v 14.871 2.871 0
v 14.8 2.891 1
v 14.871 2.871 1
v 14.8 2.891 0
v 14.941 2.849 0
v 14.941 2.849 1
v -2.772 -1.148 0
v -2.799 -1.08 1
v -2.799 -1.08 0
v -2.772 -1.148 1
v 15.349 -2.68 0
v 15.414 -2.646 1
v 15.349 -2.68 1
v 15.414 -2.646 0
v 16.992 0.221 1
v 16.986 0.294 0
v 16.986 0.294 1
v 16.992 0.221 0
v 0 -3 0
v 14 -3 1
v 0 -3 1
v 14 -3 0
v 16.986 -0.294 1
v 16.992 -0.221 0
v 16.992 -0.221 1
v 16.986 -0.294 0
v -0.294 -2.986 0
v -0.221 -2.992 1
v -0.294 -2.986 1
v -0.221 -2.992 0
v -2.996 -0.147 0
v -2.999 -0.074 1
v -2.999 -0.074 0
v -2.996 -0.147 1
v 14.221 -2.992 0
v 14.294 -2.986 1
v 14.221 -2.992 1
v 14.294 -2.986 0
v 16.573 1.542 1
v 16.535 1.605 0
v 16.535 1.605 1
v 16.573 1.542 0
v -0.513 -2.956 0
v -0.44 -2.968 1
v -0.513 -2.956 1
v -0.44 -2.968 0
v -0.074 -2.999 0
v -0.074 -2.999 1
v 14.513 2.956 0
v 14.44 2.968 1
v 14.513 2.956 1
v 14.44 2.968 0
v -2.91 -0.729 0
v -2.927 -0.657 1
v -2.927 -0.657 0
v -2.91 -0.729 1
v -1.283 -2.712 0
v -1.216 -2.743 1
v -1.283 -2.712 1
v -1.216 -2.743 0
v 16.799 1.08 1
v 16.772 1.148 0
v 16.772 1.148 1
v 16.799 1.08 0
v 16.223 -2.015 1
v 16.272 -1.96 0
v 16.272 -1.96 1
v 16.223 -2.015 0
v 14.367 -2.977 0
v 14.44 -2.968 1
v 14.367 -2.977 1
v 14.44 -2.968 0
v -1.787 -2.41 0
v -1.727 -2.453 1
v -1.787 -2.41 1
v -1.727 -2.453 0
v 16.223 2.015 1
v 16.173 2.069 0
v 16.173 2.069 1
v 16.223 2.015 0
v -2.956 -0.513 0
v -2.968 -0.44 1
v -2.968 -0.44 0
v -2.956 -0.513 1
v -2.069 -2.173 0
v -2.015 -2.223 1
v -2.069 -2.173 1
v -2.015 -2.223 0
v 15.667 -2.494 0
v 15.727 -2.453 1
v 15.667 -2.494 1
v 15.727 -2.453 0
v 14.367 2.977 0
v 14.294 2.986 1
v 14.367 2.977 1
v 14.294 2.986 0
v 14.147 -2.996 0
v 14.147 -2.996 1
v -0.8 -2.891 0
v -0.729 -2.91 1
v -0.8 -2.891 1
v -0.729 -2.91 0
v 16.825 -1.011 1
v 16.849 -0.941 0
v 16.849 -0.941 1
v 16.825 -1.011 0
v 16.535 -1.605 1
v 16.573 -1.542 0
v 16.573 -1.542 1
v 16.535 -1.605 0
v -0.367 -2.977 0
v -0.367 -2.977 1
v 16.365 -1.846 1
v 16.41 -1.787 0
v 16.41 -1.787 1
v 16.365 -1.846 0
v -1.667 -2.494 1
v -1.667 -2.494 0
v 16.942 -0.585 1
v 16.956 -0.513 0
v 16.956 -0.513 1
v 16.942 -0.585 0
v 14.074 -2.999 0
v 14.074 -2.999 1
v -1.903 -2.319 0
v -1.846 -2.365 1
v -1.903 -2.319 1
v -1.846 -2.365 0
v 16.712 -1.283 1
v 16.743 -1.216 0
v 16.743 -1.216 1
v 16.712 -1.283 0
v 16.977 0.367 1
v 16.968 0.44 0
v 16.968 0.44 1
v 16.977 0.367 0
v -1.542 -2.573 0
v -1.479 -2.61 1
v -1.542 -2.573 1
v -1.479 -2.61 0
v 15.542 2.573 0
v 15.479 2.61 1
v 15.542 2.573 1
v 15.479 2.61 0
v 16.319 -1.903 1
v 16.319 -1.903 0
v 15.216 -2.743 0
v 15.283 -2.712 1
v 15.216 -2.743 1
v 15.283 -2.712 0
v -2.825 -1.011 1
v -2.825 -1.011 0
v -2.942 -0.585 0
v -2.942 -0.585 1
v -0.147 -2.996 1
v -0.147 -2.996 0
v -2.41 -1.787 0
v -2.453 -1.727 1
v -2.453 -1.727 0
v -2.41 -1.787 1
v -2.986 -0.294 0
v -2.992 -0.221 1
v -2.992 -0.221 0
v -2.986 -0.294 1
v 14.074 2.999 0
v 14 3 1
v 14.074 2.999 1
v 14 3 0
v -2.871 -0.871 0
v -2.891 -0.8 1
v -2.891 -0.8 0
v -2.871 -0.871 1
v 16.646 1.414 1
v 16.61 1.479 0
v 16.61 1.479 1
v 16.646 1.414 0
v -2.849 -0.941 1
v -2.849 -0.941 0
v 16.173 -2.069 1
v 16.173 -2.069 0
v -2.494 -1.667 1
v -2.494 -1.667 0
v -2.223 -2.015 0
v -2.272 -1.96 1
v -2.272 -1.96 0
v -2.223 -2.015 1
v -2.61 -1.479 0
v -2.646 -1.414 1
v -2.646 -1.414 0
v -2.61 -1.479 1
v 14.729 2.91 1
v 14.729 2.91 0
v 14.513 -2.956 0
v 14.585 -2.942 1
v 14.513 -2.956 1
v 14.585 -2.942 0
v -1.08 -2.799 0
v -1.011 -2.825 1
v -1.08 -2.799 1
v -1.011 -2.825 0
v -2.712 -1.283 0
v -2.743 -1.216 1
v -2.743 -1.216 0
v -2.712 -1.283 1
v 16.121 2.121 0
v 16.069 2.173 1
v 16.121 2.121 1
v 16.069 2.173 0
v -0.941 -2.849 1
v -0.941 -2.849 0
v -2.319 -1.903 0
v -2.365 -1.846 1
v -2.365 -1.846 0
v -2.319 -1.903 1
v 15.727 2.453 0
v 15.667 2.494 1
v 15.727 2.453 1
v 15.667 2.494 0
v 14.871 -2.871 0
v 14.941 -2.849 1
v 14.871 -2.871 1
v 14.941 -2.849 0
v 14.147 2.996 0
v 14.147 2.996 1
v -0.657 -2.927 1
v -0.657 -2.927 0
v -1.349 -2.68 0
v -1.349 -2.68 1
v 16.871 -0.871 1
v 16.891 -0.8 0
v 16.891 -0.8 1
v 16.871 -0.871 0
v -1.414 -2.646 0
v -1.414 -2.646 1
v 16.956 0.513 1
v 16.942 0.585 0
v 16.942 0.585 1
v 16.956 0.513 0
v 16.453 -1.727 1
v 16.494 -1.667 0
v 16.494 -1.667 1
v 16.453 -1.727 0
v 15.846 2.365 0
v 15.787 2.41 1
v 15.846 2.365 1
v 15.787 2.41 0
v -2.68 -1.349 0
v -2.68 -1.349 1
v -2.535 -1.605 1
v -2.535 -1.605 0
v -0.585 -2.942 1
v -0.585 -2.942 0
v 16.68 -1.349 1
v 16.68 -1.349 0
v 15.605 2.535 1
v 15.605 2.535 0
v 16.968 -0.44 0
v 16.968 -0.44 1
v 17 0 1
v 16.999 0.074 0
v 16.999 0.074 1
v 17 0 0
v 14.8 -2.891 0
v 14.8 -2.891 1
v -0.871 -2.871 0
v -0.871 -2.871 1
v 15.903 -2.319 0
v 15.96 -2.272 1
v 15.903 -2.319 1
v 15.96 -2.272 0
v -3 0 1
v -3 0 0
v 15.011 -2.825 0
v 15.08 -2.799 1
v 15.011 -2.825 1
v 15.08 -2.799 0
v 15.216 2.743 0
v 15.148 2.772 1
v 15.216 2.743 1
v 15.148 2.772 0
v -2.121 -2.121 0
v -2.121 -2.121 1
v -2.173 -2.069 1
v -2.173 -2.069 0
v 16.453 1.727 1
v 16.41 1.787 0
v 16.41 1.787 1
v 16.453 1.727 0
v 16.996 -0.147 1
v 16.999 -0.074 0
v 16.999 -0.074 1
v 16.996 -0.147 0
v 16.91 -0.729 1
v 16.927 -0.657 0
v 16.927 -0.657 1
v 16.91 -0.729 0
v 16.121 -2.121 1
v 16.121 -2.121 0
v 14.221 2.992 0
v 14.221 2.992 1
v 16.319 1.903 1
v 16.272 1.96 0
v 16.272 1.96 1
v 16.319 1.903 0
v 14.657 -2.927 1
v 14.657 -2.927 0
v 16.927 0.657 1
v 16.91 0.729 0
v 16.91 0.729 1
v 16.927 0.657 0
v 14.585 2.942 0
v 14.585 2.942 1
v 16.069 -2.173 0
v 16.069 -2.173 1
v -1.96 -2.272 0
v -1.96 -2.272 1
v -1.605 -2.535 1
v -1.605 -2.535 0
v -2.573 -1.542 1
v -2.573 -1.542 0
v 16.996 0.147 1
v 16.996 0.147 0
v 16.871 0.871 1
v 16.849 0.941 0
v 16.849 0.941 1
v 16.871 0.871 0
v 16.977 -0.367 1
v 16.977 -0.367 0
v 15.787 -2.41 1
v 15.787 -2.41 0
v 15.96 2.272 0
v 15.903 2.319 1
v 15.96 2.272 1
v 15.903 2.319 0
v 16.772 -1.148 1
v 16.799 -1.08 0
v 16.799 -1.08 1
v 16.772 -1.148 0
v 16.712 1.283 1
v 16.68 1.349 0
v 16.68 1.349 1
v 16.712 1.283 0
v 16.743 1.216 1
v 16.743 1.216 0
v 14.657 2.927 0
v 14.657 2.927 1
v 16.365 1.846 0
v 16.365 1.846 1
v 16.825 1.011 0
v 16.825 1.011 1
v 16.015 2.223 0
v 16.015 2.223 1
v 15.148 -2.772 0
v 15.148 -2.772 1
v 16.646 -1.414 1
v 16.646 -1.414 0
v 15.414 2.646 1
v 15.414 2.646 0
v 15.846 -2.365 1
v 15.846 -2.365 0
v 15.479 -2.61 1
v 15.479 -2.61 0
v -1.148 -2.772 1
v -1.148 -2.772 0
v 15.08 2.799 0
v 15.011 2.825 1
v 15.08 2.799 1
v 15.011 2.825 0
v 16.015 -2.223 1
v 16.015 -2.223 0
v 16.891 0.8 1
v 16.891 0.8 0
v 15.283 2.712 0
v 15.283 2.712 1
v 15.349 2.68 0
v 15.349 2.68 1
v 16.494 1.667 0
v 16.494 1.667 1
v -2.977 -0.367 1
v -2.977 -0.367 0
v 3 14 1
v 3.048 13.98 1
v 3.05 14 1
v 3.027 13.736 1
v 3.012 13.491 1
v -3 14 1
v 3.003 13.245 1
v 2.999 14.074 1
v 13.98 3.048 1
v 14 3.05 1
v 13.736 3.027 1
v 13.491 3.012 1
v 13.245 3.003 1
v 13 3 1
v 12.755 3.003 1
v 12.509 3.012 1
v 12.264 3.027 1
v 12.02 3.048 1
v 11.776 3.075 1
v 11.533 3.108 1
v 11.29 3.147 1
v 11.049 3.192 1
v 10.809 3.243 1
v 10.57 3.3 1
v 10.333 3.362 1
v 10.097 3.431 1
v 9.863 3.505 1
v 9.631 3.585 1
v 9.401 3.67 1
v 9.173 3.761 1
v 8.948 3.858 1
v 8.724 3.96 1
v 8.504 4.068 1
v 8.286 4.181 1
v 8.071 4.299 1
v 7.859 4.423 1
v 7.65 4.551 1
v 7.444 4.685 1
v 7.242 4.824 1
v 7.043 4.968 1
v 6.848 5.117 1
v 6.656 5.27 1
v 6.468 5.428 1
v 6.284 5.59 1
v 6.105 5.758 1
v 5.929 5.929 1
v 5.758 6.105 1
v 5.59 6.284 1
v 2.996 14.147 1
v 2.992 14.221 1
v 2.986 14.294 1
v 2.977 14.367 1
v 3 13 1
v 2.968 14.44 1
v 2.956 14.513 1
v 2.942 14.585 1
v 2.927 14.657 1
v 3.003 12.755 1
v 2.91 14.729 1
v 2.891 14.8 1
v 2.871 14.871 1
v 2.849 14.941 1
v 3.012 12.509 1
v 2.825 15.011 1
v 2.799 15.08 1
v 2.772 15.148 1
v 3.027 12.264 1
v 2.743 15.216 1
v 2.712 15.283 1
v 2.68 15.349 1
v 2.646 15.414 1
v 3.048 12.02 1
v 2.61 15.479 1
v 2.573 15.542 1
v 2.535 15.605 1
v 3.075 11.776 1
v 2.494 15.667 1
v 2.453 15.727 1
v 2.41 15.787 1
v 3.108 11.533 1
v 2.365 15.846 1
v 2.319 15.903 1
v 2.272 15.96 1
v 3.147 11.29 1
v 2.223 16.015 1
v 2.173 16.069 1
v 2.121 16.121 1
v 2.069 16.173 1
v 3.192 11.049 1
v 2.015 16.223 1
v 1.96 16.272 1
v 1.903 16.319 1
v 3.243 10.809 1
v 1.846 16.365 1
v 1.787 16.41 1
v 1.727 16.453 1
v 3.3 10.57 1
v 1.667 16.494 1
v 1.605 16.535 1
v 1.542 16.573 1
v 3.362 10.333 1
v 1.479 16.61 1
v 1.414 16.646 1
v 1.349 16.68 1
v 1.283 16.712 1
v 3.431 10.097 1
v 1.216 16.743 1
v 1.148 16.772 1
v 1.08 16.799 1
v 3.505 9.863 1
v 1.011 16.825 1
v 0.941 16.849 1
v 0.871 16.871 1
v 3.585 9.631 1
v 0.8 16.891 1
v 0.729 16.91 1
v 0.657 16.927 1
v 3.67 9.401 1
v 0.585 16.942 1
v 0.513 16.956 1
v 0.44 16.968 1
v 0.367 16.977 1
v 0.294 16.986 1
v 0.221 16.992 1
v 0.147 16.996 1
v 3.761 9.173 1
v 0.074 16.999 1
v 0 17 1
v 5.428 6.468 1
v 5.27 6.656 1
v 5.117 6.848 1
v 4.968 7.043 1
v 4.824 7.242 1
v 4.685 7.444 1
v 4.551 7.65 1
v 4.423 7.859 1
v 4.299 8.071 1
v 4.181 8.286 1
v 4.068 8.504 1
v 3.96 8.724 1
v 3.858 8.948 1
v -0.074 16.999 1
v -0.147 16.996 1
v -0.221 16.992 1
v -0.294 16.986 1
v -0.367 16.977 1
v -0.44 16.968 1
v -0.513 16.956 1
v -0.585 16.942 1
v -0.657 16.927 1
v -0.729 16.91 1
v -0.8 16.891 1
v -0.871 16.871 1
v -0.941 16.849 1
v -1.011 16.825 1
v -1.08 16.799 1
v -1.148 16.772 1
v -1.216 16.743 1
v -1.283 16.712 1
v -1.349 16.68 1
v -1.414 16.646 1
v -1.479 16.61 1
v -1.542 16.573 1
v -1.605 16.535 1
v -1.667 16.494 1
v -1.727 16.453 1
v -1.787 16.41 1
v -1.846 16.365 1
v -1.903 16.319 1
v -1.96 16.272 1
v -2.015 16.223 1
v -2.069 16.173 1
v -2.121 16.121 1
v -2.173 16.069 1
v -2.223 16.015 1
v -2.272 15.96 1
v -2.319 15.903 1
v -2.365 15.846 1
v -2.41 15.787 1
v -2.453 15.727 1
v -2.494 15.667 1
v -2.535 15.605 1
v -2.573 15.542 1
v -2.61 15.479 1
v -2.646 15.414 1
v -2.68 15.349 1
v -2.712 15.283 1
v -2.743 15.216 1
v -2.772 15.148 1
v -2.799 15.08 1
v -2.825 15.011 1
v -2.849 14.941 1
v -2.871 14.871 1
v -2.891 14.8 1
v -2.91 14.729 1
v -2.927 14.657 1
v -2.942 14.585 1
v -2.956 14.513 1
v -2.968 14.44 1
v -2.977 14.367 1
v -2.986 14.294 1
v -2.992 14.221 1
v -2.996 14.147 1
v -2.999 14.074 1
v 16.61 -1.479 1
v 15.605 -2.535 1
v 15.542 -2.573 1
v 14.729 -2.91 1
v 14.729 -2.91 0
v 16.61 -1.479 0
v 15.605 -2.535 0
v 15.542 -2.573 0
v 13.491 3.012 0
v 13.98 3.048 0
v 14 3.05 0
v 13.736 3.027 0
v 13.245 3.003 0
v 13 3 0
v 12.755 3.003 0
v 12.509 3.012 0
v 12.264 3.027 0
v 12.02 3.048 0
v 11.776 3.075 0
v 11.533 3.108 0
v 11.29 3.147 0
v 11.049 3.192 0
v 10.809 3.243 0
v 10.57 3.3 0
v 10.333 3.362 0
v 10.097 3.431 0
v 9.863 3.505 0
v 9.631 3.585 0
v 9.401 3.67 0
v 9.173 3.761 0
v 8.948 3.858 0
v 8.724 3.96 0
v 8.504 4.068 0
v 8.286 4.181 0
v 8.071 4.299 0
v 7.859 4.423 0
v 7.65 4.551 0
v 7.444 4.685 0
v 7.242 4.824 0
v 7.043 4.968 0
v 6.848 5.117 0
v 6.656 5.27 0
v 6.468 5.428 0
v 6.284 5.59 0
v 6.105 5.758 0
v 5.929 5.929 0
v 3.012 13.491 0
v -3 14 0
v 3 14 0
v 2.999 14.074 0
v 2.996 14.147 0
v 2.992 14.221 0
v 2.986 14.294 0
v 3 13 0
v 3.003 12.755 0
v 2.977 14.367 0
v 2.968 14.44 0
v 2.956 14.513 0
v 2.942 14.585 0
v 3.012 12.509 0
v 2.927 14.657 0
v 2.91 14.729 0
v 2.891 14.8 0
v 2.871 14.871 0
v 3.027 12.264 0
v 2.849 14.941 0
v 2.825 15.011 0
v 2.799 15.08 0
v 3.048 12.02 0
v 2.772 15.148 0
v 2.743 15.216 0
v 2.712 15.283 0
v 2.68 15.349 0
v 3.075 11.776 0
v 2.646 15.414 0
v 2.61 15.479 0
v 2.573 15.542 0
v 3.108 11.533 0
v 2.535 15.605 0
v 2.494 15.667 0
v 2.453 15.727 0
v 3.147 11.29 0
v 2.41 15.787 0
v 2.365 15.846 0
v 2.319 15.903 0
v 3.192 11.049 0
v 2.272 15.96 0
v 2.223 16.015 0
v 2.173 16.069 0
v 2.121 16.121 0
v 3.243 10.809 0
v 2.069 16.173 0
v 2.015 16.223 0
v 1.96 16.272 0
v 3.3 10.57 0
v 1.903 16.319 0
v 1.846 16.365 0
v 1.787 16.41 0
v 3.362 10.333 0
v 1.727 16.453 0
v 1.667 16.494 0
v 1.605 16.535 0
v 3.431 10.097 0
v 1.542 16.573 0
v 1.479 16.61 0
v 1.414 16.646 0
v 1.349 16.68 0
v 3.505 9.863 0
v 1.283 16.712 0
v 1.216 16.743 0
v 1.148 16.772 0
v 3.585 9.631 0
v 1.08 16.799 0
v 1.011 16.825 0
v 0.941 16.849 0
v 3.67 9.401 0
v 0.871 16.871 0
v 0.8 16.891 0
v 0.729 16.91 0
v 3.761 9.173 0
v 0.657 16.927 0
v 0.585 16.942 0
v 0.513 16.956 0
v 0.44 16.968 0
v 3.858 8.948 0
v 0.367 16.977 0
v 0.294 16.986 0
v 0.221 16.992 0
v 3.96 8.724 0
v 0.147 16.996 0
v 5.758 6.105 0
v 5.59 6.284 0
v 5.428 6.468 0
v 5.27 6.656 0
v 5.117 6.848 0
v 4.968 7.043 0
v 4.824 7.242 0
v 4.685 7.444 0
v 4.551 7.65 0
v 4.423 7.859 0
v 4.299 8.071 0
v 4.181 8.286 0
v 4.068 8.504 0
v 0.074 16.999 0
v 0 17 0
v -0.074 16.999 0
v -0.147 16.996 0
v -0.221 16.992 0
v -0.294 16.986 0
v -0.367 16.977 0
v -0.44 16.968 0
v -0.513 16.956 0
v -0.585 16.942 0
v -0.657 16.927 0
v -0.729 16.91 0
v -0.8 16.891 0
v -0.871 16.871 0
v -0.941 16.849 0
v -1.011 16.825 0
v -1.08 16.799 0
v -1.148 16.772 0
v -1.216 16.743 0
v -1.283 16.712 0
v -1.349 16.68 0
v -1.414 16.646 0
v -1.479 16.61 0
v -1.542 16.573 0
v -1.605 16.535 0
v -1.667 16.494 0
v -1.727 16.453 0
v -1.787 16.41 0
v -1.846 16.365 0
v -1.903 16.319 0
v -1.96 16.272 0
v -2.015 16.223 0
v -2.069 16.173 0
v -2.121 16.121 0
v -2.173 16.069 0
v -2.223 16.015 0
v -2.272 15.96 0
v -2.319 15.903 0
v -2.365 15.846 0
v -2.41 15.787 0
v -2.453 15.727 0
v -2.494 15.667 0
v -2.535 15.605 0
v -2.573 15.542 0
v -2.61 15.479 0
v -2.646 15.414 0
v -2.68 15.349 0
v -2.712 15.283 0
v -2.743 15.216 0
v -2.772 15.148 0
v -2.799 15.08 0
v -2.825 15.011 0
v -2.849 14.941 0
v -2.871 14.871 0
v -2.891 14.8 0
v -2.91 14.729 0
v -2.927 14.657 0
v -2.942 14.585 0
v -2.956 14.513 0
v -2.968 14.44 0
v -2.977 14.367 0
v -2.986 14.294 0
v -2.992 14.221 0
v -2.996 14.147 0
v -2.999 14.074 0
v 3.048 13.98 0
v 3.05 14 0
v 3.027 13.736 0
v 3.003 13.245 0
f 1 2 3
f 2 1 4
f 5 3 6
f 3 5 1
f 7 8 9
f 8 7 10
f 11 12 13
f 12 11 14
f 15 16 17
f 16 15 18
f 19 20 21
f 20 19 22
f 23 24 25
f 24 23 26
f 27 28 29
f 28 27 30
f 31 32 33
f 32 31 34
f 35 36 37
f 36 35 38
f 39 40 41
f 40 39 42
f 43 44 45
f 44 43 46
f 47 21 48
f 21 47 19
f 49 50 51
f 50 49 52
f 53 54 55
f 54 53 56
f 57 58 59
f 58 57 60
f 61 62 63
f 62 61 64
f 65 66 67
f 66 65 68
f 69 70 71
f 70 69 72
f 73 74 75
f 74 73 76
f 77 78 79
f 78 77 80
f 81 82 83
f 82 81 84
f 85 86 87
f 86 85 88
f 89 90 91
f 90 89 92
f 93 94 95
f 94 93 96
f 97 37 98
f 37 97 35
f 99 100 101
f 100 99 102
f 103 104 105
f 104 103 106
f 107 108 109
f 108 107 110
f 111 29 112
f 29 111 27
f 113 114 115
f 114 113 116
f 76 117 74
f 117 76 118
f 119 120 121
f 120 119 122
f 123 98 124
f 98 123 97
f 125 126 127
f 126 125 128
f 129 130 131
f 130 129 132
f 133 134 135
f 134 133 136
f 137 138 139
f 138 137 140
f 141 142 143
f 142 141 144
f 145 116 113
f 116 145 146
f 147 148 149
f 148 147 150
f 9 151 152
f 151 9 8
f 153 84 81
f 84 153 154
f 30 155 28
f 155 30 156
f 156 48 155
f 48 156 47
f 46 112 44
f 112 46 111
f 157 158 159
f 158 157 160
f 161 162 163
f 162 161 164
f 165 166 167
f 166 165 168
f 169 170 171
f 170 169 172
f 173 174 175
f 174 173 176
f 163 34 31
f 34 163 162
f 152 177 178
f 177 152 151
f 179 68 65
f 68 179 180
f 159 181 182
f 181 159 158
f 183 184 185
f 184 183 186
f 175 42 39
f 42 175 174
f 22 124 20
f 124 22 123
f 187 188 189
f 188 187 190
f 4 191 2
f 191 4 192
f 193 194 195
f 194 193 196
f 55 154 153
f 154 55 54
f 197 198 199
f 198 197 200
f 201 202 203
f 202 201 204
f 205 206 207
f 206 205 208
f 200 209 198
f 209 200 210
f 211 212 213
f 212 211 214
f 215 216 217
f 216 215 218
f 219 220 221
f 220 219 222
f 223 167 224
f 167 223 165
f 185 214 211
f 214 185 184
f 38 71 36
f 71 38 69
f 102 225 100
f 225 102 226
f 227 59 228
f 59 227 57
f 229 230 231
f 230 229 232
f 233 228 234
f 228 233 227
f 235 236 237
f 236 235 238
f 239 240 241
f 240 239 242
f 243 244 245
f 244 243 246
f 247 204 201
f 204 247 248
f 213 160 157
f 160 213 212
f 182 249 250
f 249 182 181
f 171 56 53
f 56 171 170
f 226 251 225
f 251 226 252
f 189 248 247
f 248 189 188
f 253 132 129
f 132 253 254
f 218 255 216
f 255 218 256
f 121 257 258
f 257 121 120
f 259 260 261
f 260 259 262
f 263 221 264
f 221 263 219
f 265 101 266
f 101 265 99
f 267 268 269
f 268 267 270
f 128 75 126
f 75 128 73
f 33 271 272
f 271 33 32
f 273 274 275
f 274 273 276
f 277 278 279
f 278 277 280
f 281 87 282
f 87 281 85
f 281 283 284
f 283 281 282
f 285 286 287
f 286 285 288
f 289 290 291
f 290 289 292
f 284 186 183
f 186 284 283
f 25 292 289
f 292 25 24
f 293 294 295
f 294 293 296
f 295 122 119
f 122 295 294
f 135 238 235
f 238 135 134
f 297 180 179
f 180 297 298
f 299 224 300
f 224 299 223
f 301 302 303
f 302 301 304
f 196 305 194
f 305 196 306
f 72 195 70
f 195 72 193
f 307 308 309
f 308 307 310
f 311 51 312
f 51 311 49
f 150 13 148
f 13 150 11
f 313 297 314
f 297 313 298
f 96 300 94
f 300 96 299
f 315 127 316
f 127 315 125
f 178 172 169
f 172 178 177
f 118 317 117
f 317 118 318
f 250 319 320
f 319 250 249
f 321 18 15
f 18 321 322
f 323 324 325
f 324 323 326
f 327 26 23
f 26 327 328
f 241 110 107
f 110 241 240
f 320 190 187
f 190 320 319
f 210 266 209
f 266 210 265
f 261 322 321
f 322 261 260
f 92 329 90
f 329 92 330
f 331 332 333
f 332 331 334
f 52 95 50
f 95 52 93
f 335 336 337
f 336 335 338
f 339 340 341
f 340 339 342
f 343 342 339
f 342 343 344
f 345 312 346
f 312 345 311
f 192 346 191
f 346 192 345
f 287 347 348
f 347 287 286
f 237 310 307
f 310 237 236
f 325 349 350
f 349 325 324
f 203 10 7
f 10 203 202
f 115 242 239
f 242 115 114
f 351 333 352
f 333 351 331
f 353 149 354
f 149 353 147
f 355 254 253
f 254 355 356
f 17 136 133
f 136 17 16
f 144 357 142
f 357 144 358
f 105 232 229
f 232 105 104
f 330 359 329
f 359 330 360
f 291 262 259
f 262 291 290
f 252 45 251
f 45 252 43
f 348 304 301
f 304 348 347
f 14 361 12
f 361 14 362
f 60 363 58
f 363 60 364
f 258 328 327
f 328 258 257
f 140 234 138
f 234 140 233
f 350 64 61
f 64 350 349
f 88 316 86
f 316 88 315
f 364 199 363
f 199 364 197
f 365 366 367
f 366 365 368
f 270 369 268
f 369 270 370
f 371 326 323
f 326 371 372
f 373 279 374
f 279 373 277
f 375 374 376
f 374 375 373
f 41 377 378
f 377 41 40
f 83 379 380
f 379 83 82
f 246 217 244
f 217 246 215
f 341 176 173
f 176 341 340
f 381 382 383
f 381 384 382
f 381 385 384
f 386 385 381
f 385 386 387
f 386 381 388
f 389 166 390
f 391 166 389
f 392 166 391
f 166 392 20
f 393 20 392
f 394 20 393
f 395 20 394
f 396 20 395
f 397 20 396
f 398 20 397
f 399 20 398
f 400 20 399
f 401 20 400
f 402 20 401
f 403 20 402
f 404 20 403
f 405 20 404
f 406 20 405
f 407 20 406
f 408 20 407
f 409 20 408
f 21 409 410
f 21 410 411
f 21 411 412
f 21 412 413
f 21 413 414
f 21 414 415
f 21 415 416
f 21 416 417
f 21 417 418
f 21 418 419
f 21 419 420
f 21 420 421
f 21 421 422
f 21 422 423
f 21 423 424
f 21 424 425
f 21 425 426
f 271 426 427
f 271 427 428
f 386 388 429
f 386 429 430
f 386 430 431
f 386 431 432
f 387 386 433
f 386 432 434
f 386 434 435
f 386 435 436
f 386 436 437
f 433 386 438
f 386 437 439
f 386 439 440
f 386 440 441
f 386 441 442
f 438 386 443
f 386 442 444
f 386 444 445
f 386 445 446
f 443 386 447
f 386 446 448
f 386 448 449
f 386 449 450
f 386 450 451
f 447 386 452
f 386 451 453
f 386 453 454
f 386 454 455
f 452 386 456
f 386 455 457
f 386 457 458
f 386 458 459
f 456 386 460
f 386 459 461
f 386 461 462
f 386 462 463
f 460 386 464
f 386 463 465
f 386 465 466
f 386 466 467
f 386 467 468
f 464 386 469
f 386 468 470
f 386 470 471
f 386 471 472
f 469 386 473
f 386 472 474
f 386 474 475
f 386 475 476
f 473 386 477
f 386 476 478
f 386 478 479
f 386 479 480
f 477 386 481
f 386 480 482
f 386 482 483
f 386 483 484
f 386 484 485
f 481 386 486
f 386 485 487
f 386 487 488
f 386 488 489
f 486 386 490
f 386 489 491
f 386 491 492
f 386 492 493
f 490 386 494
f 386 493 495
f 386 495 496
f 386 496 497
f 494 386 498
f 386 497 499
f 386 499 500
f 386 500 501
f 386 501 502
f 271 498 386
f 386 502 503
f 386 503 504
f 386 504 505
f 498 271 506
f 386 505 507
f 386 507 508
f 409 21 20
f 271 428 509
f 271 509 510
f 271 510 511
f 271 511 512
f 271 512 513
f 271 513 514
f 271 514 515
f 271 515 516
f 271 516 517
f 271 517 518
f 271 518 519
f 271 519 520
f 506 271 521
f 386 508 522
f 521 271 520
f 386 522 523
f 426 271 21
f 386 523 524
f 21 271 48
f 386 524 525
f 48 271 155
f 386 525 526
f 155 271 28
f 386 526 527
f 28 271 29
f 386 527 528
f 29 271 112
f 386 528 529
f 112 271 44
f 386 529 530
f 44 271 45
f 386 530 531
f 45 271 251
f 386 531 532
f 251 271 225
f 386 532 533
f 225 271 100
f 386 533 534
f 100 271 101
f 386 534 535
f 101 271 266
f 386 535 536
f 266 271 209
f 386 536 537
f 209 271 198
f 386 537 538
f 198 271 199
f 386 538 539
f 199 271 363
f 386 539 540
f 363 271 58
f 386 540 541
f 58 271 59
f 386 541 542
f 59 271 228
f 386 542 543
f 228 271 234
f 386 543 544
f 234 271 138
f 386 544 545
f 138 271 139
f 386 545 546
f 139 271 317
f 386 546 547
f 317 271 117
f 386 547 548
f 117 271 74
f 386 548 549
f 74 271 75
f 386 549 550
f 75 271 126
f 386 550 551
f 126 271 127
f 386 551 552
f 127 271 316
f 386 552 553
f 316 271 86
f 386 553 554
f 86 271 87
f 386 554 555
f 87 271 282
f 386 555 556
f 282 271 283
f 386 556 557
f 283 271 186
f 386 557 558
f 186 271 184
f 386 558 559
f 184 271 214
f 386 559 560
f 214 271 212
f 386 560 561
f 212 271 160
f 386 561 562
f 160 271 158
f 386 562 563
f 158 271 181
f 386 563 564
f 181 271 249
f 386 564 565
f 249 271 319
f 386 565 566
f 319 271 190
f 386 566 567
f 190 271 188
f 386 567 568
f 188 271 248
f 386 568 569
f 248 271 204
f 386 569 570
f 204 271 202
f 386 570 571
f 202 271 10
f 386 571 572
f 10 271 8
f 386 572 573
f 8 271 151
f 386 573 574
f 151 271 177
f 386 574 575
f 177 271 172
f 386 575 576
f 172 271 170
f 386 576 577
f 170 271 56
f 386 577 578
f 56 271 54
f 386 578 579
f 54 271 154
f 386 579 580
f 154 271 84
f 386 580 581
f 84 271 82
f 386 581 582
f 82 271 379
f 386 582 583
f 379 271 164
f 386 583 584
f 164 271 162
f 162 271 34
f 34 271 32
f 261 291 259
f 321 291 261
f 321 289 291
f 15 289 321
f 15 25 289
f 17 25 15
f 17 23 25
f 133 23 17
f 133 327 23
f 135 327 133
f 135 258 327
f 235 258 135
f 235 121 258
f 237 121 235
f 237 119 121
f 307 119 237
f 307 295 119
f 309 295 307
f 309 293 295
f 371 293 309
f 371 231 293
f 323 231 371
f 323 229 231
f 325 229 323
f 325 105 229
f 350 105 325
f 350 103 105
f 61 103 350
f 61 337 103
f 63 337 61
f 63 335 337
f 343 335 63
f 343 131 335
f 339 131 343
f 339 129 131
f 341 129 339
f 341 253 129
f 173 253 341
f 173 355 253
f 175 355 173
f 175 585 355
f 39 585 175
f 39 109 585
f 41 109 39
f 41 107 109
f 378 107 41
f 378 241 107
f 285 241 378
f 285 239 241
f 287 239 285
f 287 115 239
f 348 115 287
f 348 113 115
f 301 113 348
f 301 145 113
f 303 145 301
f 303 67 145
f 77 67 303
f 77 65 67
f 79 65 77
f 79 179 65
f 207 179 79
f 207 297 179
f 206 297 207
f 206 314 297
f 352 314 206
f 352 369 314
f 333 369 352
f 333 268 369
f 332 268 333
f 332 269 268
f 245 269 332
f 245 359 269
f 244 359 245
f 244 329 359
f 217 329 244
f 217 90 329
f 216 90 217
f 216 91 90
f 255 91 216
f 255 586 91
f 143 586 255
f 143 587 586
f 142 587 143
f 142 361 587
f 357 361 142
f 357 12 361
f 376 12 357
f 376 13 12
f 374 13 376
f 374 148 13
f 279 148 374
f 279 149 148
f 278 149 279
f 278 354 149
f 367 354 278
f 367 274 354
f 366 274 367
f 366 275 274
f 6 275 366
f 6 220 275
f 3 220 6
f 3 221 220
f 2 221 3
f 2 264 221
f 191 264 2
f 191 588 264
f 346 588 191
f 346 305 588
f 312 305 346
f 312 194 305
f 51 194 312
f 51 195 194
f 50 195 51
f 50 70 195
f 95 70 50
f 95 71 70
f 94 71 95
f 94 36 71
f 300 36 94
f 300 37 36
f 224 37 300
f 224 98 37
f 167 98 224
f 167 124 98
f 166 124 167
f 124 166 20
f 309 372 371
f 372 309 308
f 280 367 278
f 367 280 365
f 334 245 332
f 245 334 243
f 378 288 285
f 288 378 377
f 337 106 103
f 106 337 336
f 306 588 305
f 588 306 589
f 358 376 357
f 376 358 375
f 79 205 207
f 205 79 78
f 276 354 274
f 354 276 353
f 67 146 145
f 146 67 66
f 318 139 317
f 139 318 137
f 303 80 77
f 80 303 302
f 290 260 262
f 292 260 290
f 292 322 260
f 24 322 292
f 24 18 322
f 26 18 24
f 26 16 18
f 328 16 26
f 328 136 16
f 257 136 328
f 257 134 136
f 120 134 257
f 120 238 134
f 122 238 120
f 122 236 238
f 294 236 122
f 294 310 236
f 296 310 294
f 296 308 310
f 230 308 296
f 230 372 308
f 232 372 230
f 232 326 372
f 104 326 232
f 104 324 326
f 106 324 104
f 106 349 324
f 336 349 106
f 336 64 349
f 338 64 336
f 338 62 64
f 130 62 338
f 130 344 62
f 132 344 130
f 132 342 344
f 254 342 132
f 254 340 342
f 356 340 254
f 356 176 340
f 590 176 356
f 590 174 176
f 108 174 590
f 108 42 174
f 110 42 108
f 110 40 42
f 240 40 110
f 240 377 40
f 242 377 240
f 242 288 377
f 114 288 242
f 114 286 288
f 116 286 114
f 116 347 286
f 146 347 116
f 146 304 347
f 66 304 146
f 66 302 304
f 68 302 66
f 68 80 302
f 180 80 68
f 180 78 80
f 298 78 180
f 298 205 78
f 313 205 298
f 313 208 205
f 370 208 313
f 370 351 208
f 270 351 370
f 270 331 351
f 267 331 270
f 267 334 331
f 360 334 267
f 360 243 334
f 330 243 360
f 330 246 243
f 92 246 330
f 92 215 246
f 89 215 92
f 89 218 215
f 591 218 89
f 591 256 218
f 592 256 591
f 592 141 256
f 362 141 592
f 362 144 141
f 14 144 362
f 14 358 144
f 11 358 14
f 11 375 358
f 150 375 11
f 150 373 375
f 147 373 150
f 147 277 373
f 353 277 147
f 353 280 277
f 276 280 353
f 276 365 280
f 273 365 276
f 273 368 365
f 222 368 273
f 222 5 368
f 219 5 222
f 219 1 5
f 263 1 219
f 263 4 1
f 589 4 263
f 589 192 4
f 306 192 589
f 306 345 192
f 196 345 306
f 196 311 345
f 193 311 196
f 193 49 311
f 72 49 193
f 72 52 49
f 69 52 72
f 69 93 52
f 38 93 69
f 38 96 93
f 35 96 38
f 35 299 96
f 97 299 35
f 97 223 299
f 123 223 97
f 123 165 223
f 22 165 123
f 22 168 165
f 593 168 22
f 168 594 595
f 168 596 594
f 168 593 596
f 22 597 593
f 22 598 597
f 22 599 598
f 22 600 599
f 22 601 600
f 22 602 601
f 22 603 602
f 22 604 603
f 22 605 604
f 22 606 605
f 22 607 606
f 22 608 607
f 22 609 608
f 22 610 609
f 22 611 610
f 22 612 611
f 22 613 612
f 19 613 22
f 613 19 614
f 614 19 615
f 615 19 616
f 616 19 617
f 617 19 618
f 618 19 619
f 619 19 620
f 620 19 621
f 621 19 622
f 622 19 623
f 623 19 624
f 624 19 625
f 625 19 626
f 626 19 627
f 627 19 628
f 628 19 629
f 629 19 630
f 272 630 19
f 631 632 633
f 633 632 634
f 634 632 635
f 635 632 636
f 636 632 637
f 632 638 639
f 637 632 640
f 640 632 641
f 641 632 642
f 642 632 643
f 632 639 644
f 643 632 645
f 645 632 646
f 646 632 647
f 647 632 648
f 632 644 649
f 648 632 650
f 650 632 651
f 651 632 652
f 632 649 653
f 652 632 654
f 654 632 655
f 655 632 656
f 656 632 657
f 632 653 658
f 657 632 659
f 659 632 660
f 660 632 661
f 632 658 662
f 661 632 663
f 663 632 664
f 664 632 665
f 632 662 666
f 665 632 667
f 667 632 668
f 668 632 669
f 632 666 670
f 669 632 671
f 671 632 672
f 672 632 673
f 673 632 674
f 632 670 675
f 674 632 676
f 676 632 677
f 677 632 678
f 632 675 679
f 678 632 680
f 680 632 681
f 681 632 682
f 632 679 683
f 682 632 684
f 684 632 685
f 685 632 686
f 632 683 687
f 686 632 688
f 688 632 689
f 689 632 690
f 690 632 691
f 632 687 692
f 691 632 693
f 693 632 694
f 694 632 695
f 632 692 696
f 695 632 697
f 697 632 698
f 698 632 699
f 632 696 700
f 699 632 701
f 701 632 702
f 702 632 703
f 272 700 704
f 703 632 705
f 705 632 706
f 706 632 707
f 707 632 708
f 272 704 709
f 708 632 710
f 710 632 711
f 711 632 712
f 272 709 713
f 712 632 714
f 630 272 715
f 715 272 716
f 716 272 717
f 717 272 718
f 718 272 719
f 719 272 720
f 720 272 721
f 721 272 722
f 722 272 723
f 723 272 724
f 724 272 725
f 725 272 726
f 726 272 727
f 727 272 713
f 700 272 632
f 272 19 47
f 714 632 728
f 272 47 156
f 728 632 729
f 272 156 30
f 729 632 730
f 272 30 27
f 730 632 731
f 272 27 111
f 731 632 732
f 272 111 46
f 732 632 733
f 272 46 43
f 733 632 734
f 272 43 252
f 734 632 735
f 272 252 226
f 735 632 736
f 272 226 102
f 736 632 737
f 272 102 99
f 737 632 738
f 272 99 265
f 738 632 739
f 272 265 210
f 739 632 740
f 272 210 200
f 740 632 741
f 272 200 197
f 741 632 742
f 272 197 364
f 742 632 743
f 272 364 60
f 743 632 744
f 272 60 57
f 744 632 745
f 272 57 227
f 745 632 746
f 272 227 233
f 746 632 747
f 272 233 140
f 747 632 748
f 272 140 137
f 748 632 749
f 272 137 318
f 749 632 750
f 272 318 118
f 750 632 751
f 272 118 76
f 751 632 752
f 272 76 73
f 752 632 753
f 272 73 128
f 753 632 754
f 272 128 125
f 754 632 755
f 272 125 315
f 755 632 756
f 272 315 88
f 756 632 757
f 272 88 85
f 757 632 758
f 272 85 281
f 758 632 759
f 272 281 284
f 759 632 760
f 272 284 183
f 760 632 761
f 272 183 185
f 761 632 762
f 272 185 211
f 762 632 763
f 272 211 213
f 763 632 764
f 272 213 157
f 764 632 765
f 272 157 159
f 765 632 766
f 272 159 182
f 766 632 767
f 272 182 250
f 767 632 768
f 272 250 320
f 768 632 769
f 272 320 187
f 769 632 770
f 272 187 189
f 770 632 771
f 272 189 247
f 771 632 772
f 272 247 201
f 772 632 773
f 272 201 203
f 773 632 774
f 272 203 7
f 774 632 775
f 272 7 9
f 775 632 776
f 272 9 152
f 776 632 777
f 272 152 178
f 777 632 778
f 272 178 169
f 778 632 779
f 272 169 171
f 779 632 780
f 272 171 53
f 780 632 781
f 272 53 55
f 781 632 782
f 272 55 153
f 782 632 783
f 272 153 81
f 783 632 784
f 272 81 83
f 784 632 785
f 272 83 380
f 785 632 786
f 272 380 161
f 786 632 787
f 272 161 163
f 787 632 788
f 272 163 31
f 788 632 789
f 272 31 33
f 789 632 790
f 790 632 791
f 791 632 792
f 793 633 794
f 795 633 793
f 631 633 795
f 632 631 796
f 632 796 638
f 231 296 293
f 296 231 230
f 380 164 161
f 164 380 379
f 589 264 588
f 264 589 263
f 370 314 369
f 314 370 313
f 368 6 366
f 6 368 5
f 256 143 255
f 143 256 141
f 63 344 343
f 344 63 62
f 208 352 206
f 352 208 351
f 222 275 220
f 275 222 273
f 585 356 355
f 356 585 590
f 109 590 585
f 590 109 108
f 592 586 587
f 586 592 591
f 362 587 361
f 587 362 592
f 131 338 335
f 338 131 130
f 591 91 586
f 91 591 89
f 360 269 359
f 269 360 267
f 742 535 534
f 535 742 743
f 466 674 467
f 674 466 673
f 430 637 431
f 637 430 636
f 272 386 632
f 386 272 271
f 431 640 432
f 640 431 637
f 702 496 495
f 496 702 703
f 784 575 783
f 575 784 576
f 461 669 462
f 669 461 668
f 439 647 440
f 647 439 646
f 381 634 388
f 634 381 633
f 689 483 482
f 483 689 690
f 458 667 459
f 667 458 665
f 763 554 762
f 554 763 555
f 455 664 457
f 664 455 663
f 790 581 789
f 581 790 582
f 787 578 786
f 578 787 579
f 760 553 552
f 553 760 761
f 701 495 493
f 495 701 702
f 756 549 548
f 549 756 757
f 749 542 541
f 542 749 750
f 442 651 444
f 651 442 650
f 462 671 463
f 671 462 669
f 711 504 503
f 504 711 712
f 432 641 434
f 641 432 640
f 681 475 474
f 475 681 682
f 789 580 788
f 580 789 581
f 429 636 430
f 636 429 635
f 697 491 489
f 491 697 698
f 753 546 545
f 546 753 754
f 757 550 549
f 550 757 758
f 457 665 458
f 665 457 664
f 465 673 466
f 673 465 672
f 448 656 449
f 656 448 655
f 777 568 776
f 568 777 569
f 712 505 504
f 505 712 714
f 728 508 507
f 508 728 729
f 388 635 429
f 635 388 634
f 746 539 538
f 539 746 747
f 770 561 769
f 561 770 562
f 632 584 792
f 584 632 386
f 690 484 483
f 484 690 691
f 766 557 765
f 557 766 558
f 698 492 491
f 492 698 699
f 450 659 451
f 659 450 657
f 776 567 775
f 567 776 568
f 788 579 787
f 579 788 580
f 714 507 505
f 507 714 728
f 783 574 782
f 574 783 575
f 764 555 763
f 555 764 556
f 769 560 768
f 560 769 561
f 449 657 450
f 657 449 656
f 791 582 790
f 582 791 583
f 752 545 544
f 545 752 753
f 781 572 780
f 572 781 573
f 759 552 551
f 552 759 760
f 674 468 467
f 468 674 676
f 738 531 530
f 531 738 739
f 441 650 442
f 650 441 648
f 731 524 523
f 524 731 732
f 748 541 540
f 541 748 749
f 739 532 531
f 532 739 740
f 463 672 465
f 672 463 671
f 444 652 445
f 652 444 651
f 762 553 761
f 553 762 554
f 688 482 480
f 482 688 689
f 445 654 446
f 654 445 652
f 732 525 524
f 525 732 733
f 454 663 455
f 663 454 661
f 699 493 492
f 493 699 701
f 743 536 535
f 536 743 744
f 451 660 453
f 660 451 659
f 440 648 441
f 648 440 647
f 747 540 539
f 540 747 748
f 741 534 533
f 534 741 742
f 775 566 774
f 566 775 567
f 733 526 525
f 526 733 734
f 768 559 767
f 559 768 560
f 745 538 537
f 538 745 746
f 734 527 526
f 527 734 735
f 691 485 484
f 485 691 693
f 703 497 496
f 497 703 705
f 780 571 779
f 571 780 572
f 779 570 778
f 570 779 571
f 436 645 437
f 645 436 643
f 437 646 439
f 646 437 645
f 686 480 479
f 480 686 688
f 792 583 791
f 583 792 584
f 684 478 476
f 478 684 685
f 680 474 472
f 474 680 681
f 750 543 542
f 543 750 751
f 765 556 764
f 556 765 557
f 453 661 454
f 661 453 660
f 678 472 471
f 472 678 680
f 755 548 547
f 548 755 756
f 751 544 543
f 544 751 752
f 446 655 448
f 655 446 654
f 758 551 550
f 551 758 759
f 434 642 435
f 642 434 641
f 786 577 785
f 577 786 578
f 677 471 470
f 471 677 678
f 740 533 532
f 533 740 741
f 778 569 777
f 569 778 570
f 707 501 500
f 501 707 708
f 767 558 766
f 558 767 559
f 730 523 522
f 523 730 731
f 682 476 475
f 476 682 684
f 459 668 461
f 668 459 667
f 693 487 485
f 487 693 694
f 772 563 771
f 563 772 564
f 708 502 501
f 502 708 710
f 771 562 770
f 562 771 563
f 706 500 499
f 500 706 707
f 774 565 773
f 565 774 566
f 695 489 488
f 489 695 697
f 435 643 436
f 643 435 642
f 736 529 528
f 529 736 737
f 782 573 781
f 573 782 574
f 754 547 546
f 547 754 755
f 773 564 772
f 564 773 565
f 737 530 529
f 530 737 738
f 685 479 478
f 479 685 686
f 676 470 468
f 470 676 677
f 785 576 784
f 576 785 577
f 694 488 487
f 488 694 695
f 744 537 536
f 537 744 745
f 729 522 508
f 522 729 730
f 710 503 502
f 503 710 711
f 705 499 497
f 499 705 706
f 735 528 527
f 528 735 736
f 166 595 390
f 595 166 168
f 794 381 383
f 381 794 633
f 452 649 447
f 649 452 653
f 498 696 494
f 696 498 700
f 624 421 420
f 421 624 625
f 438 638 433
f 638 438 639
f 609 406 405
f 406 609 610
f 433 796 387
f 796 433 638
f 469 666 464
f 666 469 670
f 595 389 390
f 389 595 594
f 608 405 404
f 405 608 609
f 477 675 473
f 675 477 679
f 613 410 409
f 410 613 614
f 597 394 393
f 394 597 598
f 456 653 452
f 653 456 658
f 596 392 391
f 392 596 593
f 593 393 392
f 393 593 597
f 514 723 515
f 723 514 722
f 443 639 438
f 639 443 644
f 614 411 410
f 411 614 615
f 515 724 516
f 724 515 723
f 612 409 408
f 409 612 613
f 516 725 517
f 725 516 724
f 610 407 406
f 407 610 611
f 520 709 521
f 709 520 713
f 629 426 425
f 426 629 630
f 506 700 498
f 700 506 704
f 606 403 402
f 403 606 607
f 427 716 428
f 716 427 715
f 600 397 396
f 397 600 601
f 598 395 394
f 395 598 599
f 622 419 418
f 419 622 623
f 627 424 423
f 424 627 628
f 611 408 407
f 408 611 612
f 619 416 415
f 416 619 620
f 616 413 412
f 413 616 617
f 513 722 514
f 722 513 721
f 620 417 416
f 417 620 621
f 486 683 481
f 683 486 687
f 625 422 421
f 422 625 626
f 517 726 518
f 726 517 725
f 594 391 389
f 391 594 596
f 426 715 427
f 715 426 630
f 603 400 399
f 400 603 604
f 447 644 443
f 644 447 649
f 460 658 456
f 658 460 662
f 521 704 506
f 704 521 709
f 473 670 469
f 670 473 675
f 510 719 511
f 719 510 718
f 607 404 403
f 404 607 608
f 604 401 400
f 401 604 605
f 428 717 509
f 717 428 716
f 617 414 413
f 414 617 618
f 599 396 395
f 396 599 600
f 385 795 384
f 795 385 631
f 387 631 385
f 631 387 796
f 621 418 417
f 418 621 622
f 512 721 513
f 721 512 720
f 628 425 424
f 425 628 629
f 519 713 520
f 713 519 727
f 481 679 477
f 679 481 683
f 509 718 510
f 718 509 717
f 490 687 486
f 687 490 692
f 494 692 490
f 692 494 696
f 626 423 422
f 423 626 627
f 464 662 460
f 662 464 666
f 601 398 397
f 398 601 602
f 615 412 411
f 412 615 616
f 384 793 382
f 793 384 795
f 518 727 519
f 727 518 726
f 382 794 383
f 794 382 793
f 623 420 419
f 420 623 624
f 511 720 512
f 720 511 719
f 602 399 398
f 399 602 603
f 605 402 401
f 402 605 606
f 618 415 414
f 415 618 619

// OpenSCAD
/*
	hollowCylinder() v1.0.0 by robert@cosmicrealms.com from https://github.com/Sembiance/openscad-modules
	Allows you to create a hollow cylinder
	
	Usage
	=====
	Prototype: hollowCylinder(d, h, wallWidth, $fn)
	Arguments:
		-         d = Diamater of the cylinder. Default: 5
		-         h = Height of the cylinder. Default: 10
		- wallWidth = How wide the walls should be. Default: 1
		-       $fn = How smooth you want the cylinder rounding to be. Default: 128
	Change Log
	==========
	2017-01-04: v1.0.0 - Initial Release
*/

// Example code:
/*
hollowCylinder(d=10, h=20);
translate([15, 0, 0]) { hollowCylinder(d=15, h=5, wallWidth=0.1); }
translate([30, 0, 0]) { hollowCylinder(d=10, h=2, wallWidth=4.5); }
*/

module hollowCylinder(d=5, h=10, wallWidth=1, $fn=128)
{
	difference()
	{
		cylinder(d=d, h=h);
		translate([0, 0, -0.1]) { cylinder(d=d-(wallWidth*2), h=h+0.2); }
	}
}


union(){
union(){
hull(){
    hollowCylinder(6,1,0.1,256);
    translate([14,0,0]){
        hollowCylinder(6,1,0.1,256);
    }
}

hull(){
    hollowCylinder(6,1,0.1,256);
    translate([0,14,0]){
        hollowCylinder(6,1,0.1,256);
    }
}
}

translate([-7,-7,0]){
difference(){
    translate([9,9,0]){
    cube([12,12,1]);
}
translate([20,20,0]){
    cylinder(d=20, h=1, $fn=256);
}
}
}
}
